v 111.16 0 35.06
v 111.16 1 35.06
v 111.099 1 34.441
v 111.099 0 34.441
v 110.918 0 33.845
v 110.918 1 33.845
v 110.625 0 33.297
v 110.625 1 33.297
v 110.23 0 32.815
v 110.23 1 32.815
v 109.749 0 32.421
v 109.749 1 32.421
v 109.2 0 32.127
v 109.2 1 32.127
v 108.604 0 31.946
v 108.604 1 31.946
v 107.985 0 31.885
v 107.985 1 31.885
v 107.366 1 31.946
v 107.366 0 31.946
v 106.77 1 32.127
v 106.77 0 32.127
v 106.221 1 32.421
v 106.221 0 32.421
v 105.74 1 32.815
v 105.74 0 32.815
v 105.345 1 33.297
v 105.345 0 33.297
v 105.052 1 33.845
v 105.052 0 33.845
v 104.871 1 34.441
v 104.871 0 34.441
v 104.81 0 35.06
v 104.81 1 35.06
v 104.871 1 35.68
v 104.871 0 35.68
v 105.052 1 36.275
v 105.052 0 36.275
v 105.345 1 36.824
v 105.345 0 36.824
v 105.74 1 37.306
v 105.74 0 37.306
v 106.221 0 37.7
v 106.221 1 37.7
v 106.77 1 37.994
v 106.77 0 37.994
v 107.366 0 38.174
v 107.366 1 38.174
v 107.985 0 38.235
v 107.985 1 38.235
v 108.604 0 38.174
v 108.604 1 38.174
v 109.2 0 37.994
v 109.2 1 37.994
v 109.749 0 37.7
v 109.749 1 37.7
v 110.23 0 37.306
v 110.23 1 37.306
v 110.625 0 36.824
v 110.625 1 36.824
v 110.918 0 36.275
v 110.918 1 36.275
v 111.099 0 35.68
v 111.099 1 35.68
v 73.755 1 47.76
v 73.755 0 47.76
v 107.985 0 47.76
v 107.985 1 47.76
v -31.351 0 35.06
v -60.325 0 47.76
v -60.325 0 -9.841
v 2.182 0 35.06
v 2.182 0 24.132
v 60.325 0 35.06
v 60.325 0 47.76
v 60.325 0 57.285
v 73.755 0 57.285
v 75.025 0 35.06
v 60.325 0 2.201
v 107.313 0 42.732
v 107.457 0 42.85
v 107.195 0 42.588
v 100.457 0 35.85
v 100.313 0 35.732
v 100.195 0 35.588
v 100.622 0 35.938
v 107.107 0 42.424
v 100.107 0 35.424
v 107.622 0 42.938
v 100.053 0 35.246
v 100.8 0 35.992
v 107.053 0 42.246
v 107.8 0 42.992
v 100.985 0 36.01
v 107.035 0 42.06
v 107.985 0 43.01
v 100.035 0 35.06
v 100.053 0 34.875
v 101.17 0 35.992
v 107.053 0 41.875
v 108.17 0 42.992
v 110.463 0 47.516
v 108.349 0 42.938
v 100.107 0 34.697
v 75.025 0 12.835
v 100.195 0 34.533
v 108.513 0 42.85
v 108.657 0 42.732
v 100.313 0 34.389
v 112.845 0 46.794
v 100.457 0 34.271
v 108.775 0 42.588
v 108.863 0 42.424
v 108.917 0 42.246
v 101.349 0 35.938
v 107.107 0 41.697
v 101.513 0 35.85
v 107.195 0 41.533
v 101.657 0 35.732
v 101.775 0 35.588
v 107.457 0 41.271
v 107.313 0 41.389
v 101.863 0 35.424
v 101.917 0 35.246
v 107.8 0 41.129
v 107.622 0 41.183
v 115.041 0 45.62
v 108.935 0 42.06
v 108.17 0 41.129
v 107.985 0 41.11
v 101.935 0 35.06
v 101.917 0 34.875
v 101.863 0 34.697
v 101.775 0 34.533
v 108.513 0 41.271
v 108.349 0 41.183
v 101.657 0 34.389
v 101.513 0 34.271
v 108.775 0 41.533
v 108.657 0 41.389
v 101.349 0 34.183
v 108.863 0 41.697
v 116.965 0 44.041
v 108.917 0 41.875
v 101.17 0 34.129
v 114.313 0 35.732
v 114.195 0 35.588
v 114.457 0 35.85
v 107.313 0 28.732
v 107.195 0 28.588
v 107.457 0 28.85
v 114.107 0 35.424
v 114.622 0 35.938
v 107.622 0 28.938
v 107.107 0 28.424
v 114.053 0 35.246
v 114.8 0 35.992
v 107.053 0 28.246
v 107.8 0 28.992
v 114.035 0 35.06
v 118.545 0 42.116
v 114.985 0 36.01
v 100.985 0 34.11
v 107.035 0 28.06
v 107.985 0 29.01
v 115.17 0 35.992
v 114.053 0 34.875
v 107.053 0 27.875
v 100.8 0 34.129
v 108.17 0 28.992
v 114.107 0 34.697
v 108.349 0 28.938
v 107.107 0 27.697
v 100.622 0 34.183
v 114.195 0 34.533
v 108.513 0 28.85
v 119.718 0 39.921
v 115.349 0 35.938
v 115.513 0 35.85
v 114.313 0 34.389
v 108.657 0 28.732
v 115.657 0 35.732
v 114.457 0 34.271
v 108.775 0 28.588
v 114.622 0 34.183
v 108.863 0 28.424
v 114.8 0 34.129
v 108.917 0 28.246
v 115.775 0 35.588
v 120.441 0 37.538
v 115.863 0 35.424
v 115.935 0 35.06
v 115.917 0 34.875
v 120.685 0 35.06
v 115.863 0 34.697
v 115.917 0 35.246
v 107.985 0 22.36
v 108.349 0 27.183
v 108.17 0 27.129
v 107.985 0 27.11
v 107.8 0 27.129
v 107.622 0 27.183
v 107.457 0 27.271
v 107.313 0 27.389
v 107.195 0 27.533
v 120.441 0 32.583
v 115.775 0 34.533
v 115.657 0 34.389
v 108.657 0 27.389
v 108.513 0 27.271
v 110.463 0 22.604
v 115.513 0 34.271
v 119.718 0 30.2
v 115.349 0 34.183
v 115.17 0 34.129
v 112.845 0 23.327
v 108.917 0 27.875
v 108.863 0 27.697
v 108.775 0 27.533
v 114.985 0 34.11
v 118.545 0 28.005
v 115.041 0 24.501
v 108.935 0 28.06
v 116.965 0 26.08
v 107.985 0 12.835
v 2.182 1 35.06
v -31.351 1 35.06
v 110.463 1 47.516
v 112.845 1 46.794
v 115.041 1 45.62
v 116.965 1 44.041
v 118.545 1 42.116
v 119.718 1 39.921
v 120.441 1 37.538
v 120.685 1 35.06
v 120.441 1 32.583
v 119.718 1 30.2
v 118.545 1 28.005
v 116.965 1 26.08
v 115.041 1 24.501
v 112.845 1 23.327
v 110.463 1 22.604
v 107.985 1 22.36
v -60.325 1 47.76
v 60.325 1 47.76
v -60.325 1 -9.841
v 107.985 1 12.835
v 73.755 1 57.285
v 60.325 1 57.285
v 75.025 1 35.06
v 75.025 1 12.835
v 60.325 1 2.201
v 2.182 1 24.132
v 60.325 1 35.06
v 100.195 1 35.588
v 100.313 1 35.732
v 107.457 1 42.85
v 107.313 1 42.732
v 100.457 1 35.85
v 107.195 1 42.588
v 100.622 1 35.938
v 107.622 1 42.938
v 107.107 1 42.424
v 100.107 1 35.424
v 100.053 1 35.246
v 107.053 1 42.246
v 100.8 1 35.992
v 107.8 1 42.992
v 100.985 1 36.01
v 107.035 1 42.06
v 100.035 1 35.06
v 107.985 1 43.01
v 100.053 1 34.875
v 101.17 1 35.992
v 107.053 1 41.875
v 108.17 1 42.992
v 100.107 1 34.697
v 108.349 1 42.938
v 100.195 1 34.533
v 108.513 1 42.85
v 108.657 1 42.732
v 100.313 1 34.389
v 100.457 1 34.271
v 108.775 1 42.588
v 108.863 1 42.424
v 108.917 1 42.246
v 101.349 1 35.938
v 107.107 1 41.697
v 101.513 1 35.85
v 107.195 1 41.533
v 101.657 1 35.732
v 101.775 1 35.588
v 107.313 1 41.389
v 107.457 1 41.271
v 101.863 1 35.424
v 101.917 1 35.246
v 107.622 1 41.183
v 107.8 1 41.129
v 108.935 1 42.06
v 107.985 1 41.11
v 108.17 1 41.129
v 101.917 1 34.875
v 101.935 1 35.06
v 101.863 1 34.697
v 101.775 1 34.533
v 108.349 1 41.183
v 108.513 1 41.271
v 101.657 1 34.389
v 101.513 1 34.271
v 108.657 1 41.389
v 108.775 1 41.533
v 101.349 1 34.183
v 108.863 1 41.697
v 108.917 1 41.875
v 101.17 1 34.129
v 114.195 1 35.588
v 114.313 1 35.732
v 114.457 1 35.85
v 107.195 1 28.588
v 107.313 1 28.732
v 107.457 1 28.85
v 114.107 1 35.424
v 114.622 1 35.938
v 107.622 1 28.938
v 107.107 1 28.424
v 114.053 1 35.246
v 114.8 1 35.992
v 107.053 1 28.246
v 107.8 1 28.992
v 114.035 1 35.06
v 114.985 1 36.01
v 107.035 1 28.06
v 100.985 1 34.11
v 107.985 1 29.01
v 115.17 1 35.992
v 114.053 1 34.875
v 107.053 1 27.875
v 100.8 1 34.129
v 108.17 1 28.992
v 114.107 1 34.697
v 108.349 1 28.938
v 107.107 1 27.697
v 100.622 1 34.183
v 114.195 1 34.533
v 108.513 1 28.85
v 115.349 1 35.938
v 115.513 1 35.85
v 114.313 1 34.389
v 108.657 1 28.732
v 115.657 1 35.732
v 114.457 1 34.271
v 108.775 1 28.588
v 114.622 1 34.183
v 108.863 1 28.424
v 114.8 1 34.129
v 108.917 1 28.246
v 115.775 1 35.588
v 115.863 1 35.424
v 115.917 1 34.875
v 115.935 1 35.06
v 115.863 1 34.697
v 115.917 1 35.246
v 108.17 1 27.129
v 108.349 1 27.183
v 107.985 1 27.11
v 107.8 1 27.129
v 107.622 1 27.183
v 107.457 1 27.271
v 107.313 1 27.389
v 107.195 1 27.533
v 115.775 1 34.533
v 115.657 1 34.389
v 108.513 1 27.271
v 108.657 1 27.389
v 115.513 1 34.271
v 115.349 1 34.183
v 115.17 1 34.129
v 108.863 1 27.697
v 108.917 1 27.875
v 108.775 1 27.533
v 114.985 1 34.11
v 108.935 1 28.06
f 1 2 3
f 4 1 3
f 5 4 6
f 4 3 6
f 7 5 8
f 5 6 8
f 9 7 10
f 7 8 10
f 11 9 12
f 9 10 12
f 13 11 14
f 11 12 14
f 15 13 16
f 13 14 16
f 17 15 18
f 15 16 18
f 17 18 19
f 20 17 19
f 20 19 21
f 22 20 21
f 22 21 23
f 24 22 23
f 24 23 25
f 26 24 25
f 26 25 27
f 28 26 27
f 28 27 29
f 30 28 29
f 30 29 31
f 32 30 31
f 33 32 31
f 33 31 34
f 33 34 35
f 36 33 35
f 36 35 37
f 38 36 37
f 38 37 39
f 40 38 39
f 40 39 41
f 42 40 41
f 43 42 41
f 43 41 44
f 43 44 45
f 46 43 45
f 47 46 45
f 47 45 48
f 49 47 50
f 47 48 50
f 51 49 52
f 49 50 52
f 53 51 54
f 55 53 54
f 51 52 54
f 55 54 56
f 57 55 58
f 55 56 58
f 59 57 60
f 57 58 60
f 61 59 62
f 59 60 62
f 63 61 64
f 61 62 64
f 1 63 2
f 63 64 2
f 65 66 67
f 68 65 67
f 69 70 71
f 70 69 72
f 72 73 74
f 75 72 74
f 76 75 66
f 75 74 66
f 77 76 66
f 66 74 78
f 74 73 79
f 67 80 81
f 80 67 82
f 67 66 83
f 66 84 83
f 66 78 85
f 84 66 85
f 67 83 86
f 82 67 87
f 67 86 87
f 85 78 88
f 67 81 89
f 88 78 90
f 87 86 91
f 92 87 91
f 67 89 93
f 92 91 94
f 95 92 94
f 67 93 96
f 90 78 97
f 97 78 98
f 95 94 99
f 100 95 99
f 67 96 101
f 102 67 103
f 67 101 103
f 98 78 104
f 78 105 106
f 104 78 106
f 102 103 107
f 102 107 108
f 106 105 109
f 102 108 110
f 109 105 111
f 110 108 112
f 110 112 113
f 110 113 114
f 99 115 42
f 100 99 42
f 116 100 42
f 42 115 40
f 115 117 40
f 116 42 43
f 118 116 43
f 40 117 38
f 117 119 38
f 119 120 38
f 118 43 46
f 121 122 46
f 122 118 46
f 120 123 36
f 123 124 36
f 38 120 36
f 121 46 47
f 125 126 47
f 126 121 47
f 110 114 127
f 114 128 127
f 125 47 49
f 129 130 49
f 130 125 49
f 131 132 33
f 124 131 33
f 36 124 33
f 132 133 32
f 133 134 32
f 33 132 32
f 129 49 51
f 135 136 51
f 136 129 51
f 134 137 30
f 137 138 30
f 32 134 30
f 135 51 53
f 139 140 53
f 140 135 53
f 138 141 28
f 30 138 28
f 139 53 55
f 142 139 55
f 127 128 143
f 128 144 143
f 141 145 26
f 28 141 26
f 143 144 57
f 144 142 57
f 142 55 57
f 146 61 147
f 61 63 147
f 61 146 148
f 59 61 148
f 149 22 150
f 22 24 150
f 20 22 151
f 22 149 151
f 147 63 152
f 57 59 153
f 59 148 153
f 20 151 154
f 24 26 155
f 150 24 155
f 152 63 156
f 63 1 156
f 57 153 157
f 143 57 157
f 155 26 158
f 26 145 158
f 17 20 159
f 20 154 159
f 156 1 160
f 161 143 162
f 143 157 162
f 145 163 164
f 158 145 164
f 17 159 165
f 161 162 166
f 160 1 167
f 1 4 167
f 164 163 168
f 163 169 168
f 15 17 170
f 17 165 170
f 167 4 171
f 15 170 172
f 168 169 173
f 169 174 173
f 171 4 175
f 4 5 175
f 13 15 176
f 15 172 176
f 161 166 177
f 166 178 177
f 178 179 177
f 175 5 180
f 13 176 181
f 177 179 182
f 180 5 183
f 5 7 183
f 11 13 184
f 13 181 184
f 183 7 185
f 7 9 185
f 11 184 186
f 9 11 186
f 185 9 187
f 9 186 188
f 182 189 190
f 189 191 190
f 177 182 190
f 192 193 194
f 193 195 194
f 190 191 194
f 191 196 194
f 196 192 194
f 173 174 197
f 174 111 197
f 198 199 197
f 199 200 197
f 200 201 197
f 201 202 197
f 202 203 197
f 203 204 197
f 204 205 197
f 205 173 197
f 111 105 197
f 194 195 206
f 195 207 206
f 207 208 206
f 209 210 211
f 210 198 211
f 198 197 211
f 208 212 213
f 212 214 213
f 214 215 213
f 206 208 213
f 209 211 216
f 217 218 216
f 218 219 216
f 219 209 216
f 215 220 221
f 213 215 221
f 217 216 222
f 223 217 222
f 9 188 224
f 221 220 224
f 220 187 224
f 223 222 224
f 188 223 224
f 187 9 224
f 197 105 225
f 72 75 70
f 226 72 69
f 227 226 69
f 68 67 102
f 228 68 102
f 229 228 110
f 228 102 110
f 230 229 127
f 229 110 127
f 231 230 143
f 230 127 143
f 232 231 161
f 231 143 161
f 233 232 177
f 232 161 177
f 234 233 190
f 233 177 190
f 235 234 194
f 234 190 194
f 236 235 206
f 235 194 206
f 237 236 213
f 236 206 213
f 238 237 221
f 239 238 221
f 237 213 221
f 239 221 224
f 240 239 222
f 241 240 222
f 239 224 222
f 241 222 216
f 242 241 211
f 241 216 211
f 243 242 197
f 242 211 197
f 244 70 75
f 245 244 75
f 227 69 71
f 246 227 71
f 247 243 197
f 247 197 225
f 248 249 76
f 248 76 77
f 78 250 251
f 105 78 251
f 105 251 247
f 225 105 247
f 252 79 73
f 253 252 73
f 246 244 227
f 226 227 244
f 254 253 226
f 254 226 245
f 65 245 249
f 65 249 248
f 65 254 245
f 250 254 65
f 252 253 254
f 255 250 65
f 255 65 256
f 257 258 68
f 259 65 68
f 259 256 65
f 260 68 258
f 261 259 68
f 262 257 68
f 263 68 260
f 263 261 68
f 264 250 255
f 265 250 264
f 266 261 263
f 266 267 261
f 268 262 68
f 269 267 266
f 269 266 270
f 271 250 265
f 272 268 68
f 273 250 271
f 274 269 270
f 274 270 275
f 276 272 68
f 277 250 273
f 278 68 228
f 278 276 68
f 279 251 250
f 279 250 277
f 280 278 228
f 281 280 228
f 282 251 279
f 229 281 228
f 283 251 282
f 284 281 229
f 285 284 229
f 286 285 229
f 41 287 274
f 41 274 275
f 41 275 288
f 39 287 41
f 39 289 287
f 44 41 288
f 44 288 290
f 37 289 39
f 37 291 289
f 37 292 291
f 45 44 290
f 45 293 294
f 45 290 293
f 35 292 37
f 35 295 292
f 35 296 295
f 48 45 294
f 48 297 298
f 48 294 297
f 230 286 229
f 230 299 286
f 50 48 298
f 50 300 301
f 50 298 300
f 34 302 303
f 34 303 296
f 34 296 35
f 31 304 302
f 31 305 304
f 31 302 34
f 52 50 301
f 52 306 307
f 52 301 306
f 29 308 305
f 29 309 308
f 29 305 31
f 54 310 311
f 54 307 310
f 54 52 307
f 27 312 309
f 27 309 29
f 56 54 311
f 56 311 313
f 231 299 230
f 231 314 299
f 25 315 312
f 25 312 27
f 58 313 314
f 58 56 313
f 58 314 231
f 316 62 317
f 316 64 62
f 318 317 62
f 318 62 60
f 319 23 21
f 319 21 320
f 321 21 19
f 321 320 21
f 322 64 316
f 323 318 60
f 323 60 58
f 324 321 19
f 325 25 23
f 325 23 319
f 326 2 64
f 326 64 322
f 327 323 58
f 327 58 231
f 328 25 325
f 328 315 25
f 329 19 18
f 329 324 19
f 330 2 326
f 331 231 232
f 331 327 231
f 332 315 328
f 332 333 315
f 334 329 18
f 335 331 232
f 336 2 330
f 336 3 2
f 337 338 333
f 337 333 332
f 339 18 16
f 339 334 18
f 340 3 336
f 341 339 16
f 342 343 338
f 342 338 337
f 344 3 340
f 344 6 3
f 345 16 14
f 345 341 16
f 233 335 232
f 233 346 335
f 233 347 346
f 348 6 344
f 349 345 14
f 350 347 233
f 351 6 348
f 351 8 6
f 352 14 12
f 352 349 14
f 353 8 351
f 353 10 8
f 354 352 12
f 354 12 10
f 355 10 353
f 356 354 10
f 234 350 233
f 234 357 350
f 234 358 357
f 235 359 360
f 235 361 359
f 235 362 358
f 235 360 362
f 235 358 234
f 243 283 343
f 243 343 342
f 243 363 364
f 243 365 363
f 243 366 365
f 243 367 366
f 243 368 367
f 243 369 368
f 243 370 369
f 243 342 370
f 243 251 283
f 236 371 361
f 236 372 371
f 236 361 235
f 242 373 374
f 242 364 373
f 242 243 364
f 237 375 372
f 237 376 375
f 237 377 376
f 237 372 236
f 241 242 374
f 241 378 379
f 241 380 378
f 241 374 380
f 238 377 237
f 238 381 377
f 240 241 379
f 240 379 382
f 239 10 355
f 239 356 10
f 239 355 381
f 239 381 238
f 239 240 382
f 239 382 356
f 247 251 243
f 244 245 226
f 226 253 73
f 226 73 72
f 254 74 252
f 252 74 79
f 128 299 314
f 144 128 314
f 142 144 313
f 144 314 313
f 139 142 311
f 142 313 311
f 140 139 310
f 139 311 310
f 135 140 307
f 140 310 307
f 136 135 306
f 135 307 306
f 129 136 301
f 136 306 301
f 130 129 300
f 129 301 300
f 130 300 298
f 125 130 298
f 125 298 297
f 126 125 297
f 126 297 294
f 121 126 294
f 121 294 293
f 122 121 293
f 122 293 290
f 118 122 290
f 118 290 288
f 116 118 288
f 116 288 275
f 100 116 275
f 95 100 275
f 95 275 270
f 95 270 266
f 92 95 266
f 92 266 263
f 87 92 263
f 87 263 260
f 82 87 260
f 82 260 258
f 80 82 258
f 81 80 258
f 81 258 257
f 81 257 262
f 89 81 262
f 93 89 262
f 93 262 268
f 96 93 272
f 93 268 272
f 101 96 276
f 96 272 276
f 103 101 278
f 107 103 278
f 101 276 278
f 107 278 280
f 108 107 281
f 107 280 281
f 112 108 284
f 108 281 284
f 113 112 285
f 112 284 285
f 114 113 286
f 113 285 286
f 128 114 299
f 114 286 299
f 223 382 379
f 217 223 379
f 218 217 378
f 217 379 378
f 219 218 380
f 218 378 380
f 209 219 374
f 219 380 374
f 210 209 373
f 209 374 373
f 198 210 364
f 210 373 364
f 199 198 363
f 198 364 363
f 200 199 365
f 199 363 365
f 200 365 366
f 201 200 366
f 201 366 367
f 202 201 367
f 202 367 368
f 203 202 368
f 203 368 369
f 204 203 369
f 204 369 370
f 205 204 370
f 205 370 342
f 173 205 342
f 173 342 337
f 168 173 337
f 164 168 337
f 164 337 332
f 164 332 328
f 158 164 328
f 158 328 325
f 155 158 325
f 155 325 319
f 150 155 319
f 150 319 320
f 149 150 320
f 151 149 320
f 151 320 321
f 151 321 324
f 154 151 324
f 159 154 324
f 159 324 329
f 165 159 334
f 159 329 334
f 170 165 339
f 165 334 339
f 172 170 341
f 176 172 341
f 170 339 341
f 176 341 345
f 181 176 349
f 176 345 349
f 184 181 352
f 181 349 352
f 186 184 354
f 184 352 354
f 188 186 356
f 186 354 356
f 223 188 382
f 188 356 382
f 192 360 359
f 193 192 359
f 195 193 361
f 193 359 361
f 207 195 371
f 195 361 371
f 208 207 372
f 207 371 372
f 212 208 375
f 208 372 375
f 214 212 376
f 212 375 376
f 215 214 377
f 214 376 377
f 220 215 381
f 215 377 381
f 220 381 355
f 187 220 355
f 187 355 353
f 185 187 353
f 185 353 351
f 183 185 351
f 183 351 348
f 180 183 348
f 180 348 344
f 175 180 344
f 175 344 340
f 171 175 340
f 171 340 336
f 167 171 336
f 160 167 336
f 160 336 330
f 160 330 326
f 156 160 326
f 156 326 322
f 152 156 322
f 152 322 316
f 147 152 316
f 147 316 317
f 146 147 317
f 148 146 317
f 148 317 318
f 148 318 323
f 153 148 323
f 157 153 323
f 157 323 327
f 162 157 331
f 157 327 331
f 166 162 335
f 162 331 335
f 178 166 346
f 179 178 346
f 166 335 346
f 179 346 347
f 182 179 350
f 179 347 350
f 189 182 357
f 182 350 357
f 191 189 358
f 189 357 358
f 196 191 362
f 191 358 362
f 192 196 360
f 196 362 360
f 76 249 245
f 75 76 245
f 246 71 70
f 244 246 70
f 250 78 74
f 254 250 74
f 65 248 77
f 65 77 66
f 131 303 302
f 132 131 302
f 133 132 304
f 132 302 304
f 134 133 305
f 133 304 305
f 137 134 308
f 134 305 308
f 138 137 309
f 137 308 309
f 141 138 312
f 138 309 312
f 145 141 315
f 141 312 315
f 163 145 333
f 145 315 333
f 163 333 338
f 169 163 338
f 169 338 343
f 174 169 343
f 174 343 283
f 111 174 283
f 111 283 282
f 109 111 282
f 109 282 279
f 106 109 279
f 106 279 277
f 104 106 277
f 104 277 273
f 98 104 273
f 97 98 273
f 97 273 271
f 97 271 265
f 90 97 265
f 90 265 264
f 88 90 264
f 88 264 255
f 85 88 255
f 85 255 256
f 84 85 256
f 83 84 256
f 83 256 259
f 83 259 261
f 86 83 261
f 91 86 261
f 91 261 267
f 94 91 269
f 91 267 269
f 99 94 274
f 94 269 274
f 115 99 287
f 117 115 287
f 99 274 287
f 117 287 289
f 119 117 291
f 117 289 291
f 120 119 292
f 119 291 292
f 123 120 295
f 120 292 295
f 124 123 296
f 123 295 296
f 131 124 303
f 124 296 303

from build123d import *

# Parameters (mm, degrees)
BOSS_EXTRUDE2_DEPTH     = 1.000000032
BOSS_EXTRUDE4_DEPTH     = 1.000000032
SKETCH4_R               = 3.175
SKETCH4_R_2             = 0.950000005
CUT_EXTRUDE1_DEPTH      = 1
CUT_EXTRUDE1_DEPTH_BACK = 2.000000032
SKETCH6_W               = 13.430000064
SKETCH6_H               = 9.525
SKETCH6_W_2             = 32.960056
BOSS_EXTRUDE5_DEPTH     = 1.000000032
CUT_EXTRUDE2_DEPTH      = 1
CUT_EXTRUDE2_DEPTH_BACK = 2.000000032


with BuildPart() as part:
    # Sketch2 → Boss-Extrude2 (new body)
    with BuildSketch(Plane(origin=(0, 0, 0), x_dir=(1, 0, 0), z_dir=(0, 1, 0))):
        Polygon((-31.351491175, -35.060458992), (-60.325, 9.840821613), (-60.325, -47.760458992), (0, -47.760458992), (60.325, -47.760458992), (60.325, -2.200955885), (-26.791523135, -35.060458992), align=None)
    extrude(amount=BOSS_EXTRUDE2_DEPTH)

    # Sketch5 → Boss-Extrude4 (add)
    with BuildSketch(Plane(origin=(0, 0, 0), x_dir=(1, 0, 0), z_dir=(0, 1, 0))):
        with BuildLine():
            Line((60.325, -47.760458992), (75.025000064, -47.760458992))
            Line((75.025000064, -47.760458992), (107.985056064, -47.760458992))
            ThreePointArc((107.985056064, -47.760458992), (120.685056064, -35.060458992), (107.985056064, -22.360458992))
            Line((107.985056064, -22.360458992), (75.025000064, -22.360458992))
            Line((75.025000064, -22.360458992), (75.025000064, -35.060458992))
            Line((75.025000064, -35.060458992), (60.325, -35.060458992))
            Line((60.325, -35.060458992), (60.325, -47.760458992))
        make_face()
    extrude(amount=BOSS_EXTRUDE4_DEPTH)

    # Sketch4 → Cut-Extrude1 (cut, two sides)
    with BuildSketch(Plane(origin=(0, 1.000000032, 0), x_dir=(1, 0, 0), z_dir=(0, 1, 0))) as cut_extrude1_sk:
        with Locations((107.985056064, -35.060458992)):
            Circle(SKETCH4_R)
        with Locations((107.985056064, -42.060458962)):
            Circle(SKETCH4_R_2)
        with Locations((107.985056064, -28.060459022)):
            Circle(SKETCH4_R_2)
        with Locations((100.985056094, -35.060458992)):
            Circle(SKETCH4_R_2)
        with Locations((114.985056034, -35.060458992)):
            Circle(SKETCH4_R_2)
    extrude(amount=CUT_EXTRUDE1_DEPTH, mode=Mode.SUBTRACT)
    extrude(cut_extrude1_sk.sketch, amount=-CUT_EXTRUDE1_DEPTH_BACK, mode=Mode.SUBTRACT)

    # Sketch6 → Boss-Extrude5 (add)
    with BuildSketch(Plane(origin=(0, 1.000000032, 0), x_dir=(1, 0, 0), z_dir=(0, 1, 0))):
        with Locations((67.040000032, -52.522958992)):
            Rectangle(SKETCH6_W, SKETCH6_H)
        with Locations((91.505028064, -17.597958992)):
            Rectangle(SKETCH6_W_2, SKETCH6_H)
    extrude(amount=-BOSS_EXTRUDE5_DEPTH)

    # Sketch8 → Cut-Extrude2 (cut, two sides)
    with BuildSketch(Plane(origin=(0, 1.000000032, 0), x_dir=(1, 0, 0), z_dir=(0, 1, 0))) as cut_extrude2_sk:
        Polygon((-26.791523135, -35.060458992), (2.18198569, -24.131933967), (2.18198569, -35.060458992), align=None)
    extrude(amount=CUT_EXTRUDE2_DEPTH, mode=Mode.SUBTRACT)
    extrude(cut_extrude2_sk.sketch, amount=-CUT_EXTRUDE2_DEPTH_BACK, mode=Mode.SUBTRACT)


solid = part.part
